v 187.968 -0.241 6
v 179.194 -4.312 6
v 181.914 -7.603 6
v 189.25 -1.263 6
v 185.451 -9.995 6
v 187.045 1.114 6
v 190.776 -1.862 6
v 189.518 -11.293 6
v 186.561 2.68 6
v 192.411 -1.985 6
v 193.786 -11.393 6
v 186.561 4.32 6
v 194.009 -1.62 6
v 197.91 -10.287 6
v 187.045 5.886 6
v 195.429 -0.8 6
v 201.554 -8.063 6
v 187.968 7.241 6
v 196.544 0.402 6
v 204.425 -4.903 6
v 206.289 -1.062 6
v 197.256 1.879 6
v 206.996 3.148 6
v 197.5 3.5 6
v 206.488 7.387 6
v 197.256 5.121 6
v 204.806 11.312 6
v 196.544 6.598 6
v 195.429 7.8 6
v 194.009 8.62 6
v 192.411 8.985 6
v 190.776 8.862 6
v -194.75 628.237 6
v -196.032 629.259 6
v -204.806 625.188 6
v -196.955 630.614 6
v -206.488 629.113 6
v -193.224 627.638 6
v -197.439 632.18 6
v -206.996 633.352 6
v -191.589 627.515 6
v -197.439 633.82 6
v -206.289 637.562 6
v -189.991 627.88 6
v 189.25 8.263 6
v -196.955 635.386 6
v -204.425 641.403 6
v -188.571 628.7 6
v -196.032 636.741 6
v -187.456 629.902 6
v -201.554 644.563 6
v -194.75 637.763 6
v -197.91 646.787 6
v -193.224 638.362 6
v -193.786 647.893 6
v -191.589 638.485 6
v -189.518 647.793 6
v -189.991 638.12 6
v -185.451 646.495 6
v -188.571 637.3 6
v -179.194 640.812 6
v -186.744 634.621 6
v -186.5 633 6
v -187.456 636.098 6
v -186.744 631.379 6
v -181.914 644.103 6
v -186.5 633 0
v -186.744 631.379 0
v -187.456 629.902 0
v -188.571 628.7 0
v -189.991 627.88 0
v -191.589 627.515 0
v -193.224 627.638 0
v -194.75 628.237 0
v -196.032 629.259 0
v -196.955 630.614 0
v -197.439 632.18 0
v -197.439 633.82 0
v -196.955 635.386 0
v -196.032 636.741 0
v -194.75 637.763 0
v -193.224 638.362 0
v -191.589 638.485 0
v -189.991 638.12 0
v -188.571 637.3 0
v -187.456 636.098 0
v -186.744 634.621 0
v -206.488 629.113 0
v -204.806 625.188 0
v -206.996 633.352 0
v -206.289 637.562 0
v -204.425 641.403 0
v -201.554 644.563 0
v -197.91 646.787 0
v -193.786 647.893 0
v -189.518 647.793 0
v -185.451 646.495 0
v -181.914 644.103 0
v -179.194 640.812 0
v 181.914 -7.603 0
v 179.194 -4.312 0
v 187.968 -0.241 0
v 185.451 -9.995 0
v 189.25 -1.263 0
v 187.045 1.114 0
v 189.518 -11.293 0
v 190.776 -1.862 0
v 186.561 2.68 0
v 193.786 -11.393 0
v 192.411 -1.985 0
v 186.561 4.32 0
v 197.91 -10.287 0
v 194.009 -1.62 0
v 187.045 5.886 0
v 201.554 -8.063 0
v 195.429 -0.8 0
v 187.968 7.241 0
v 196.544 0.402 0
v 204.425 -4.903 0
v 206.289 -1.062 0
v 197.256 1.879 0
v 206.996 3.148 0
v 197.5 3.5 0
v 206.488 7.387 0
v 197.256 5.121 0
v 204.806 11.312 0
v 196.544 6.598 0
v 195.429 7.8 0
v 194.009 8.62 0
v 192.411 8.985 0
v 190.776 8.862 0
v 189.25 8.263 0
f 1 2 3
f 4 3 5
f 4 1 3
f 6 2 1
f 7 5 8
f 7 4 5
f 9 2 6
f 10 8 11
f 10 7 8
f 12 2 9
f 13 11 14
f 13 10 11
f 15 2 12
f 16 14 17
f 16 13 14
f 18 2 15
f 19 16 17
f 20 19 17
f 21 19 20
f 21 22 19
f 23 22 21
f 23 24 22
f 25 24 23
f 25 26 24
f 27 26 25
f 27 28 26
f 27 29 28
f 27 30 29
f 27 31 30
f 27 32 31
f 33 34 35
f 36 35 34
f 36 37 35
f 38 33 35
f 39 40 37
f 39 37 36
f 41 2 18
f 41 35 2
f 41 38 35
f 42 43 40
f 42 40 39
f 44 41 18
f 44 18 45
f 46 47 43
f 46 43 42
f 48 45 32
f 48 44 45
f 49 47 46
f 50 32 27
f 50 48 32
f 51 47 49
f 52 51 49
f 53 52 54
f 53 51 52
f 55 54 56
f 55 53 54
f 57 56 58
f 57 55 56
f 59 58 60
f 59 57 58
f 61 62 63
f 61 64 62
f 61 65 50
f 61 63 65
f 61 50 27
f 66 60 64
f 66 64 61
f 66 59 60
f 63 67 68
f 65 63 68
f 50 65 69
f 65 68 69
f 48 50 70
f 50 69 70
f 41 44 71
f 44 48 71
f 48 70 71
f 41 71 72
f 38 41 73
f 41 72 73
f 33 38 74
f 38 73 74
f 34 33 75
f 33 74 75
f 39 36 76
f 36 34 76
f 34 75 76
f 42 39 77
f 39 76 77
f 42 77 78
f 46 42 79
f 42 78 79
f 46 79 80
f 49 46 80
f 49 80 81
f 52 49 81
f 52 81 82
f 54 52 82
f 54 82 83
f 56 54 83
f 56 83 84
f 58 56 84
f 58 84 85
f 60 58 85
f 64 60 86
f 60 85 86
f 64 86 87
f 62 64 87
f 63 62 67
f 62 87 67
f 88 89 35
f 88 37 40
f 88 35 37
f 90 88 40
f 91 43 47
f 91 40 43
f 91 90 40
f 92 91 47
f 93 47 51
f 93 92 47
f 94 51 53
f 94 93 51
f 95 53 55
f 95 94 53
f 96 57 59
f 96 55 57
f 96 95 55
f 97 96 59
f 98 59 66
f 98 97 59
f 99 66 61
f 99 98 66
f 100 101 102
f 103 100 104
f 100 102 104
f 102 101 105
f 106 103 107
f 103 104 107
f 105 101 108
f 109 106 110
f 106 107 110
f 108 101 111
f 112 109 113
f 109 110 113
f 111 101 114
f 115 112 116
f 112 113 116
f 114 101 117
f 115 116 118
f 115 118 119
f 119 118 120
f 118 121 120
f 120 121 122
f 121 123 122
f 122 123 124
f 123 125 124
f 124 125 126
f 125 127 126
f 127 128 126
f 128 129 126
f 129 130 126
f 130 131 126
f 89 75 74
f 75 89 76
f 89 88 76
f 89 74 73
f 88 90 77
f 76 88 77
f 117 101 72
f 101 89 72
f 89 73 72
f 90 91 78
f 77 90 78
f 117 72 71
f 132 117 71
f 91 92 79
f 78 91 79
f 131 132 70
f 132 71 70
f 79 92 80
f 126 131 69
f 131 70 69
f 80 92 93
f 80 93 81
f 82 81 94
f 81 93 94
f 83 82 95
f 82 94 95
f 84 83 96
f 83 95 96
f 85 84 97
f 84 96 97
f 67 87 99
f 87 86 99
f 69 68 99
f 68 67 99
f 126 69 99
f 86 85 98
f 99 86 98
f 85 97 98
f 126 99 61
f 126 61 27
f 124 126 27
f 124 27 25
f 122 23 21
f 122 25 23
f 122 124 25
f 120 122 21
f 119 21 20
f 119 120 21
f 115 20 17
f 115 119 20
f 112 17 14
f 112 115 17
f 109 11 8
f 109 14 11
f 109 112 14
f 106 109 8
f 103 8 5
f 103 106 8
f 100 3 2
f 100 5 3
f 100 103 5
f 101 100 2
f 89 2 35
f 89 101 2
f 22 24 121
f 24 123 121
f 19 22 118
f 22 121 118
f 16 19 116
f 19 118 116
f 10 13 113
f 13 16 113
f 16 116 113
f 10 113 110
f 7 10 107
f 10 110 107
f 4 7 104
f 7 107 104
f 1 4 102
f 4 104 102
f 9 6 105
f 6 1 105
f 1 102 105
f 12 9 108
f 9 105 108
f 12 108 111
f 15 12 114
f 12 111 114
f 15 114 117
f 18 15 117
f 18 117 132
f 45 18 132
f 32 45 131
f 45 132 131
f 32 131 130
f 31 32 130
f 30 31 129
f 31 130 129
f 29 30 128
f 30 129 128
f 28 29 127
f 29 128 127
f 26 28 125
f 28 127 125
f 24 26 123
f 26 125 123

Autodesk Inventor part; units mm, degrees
ref_plane "YZ Plane" through (0, 0, 0) normal (1, 0, 0) x (0, 1, 0)
ref_plane "XZ Plane" through (0, 0, 0) normal (0, 1, 0) x (-1, 0, 0)
ref_plane "XY Plane" through (0, 0, 0) normal (0, 0, 1) x (1, 0, 0)
sketch "Sketch1" plane through (0, 0, 0) normal (0, 0, 1) x (1, 0, 0)
  circle A0 centre (192, 3.5) radius 5.5 projected
  circle A1 centre (-192, 633) radius 5.5 projected
  circle A2 centre (-192, 633) radius 5.5
  arc A3 (-179.1945, 640.8115) -> (-204.8055, 625.1885) centre (-192, 633) ccw
  circle A4 centre (192, 3.5) radius 5.5
  arc A5 (179.1945, -4.3115) -> (204.8055, 11.3115) centre (192, 3.5) ccw
  line L0 (-179.1945, 640.8115) -> (204.8055, 11.3115)
  line L1 (179.1945, -4.3115) -> (-204.8055, 625.1885)
  point P0 (0, 0)
  dimension "d2" = 30
  dimension "d3" = 11
  dimension "d4" = 11
  dimension "d5" = 30
extrude "Extrusion2" add sketch "Sketch1" along normal blind 6
properties part number "90-08-0850" material "Steel, Mild"
